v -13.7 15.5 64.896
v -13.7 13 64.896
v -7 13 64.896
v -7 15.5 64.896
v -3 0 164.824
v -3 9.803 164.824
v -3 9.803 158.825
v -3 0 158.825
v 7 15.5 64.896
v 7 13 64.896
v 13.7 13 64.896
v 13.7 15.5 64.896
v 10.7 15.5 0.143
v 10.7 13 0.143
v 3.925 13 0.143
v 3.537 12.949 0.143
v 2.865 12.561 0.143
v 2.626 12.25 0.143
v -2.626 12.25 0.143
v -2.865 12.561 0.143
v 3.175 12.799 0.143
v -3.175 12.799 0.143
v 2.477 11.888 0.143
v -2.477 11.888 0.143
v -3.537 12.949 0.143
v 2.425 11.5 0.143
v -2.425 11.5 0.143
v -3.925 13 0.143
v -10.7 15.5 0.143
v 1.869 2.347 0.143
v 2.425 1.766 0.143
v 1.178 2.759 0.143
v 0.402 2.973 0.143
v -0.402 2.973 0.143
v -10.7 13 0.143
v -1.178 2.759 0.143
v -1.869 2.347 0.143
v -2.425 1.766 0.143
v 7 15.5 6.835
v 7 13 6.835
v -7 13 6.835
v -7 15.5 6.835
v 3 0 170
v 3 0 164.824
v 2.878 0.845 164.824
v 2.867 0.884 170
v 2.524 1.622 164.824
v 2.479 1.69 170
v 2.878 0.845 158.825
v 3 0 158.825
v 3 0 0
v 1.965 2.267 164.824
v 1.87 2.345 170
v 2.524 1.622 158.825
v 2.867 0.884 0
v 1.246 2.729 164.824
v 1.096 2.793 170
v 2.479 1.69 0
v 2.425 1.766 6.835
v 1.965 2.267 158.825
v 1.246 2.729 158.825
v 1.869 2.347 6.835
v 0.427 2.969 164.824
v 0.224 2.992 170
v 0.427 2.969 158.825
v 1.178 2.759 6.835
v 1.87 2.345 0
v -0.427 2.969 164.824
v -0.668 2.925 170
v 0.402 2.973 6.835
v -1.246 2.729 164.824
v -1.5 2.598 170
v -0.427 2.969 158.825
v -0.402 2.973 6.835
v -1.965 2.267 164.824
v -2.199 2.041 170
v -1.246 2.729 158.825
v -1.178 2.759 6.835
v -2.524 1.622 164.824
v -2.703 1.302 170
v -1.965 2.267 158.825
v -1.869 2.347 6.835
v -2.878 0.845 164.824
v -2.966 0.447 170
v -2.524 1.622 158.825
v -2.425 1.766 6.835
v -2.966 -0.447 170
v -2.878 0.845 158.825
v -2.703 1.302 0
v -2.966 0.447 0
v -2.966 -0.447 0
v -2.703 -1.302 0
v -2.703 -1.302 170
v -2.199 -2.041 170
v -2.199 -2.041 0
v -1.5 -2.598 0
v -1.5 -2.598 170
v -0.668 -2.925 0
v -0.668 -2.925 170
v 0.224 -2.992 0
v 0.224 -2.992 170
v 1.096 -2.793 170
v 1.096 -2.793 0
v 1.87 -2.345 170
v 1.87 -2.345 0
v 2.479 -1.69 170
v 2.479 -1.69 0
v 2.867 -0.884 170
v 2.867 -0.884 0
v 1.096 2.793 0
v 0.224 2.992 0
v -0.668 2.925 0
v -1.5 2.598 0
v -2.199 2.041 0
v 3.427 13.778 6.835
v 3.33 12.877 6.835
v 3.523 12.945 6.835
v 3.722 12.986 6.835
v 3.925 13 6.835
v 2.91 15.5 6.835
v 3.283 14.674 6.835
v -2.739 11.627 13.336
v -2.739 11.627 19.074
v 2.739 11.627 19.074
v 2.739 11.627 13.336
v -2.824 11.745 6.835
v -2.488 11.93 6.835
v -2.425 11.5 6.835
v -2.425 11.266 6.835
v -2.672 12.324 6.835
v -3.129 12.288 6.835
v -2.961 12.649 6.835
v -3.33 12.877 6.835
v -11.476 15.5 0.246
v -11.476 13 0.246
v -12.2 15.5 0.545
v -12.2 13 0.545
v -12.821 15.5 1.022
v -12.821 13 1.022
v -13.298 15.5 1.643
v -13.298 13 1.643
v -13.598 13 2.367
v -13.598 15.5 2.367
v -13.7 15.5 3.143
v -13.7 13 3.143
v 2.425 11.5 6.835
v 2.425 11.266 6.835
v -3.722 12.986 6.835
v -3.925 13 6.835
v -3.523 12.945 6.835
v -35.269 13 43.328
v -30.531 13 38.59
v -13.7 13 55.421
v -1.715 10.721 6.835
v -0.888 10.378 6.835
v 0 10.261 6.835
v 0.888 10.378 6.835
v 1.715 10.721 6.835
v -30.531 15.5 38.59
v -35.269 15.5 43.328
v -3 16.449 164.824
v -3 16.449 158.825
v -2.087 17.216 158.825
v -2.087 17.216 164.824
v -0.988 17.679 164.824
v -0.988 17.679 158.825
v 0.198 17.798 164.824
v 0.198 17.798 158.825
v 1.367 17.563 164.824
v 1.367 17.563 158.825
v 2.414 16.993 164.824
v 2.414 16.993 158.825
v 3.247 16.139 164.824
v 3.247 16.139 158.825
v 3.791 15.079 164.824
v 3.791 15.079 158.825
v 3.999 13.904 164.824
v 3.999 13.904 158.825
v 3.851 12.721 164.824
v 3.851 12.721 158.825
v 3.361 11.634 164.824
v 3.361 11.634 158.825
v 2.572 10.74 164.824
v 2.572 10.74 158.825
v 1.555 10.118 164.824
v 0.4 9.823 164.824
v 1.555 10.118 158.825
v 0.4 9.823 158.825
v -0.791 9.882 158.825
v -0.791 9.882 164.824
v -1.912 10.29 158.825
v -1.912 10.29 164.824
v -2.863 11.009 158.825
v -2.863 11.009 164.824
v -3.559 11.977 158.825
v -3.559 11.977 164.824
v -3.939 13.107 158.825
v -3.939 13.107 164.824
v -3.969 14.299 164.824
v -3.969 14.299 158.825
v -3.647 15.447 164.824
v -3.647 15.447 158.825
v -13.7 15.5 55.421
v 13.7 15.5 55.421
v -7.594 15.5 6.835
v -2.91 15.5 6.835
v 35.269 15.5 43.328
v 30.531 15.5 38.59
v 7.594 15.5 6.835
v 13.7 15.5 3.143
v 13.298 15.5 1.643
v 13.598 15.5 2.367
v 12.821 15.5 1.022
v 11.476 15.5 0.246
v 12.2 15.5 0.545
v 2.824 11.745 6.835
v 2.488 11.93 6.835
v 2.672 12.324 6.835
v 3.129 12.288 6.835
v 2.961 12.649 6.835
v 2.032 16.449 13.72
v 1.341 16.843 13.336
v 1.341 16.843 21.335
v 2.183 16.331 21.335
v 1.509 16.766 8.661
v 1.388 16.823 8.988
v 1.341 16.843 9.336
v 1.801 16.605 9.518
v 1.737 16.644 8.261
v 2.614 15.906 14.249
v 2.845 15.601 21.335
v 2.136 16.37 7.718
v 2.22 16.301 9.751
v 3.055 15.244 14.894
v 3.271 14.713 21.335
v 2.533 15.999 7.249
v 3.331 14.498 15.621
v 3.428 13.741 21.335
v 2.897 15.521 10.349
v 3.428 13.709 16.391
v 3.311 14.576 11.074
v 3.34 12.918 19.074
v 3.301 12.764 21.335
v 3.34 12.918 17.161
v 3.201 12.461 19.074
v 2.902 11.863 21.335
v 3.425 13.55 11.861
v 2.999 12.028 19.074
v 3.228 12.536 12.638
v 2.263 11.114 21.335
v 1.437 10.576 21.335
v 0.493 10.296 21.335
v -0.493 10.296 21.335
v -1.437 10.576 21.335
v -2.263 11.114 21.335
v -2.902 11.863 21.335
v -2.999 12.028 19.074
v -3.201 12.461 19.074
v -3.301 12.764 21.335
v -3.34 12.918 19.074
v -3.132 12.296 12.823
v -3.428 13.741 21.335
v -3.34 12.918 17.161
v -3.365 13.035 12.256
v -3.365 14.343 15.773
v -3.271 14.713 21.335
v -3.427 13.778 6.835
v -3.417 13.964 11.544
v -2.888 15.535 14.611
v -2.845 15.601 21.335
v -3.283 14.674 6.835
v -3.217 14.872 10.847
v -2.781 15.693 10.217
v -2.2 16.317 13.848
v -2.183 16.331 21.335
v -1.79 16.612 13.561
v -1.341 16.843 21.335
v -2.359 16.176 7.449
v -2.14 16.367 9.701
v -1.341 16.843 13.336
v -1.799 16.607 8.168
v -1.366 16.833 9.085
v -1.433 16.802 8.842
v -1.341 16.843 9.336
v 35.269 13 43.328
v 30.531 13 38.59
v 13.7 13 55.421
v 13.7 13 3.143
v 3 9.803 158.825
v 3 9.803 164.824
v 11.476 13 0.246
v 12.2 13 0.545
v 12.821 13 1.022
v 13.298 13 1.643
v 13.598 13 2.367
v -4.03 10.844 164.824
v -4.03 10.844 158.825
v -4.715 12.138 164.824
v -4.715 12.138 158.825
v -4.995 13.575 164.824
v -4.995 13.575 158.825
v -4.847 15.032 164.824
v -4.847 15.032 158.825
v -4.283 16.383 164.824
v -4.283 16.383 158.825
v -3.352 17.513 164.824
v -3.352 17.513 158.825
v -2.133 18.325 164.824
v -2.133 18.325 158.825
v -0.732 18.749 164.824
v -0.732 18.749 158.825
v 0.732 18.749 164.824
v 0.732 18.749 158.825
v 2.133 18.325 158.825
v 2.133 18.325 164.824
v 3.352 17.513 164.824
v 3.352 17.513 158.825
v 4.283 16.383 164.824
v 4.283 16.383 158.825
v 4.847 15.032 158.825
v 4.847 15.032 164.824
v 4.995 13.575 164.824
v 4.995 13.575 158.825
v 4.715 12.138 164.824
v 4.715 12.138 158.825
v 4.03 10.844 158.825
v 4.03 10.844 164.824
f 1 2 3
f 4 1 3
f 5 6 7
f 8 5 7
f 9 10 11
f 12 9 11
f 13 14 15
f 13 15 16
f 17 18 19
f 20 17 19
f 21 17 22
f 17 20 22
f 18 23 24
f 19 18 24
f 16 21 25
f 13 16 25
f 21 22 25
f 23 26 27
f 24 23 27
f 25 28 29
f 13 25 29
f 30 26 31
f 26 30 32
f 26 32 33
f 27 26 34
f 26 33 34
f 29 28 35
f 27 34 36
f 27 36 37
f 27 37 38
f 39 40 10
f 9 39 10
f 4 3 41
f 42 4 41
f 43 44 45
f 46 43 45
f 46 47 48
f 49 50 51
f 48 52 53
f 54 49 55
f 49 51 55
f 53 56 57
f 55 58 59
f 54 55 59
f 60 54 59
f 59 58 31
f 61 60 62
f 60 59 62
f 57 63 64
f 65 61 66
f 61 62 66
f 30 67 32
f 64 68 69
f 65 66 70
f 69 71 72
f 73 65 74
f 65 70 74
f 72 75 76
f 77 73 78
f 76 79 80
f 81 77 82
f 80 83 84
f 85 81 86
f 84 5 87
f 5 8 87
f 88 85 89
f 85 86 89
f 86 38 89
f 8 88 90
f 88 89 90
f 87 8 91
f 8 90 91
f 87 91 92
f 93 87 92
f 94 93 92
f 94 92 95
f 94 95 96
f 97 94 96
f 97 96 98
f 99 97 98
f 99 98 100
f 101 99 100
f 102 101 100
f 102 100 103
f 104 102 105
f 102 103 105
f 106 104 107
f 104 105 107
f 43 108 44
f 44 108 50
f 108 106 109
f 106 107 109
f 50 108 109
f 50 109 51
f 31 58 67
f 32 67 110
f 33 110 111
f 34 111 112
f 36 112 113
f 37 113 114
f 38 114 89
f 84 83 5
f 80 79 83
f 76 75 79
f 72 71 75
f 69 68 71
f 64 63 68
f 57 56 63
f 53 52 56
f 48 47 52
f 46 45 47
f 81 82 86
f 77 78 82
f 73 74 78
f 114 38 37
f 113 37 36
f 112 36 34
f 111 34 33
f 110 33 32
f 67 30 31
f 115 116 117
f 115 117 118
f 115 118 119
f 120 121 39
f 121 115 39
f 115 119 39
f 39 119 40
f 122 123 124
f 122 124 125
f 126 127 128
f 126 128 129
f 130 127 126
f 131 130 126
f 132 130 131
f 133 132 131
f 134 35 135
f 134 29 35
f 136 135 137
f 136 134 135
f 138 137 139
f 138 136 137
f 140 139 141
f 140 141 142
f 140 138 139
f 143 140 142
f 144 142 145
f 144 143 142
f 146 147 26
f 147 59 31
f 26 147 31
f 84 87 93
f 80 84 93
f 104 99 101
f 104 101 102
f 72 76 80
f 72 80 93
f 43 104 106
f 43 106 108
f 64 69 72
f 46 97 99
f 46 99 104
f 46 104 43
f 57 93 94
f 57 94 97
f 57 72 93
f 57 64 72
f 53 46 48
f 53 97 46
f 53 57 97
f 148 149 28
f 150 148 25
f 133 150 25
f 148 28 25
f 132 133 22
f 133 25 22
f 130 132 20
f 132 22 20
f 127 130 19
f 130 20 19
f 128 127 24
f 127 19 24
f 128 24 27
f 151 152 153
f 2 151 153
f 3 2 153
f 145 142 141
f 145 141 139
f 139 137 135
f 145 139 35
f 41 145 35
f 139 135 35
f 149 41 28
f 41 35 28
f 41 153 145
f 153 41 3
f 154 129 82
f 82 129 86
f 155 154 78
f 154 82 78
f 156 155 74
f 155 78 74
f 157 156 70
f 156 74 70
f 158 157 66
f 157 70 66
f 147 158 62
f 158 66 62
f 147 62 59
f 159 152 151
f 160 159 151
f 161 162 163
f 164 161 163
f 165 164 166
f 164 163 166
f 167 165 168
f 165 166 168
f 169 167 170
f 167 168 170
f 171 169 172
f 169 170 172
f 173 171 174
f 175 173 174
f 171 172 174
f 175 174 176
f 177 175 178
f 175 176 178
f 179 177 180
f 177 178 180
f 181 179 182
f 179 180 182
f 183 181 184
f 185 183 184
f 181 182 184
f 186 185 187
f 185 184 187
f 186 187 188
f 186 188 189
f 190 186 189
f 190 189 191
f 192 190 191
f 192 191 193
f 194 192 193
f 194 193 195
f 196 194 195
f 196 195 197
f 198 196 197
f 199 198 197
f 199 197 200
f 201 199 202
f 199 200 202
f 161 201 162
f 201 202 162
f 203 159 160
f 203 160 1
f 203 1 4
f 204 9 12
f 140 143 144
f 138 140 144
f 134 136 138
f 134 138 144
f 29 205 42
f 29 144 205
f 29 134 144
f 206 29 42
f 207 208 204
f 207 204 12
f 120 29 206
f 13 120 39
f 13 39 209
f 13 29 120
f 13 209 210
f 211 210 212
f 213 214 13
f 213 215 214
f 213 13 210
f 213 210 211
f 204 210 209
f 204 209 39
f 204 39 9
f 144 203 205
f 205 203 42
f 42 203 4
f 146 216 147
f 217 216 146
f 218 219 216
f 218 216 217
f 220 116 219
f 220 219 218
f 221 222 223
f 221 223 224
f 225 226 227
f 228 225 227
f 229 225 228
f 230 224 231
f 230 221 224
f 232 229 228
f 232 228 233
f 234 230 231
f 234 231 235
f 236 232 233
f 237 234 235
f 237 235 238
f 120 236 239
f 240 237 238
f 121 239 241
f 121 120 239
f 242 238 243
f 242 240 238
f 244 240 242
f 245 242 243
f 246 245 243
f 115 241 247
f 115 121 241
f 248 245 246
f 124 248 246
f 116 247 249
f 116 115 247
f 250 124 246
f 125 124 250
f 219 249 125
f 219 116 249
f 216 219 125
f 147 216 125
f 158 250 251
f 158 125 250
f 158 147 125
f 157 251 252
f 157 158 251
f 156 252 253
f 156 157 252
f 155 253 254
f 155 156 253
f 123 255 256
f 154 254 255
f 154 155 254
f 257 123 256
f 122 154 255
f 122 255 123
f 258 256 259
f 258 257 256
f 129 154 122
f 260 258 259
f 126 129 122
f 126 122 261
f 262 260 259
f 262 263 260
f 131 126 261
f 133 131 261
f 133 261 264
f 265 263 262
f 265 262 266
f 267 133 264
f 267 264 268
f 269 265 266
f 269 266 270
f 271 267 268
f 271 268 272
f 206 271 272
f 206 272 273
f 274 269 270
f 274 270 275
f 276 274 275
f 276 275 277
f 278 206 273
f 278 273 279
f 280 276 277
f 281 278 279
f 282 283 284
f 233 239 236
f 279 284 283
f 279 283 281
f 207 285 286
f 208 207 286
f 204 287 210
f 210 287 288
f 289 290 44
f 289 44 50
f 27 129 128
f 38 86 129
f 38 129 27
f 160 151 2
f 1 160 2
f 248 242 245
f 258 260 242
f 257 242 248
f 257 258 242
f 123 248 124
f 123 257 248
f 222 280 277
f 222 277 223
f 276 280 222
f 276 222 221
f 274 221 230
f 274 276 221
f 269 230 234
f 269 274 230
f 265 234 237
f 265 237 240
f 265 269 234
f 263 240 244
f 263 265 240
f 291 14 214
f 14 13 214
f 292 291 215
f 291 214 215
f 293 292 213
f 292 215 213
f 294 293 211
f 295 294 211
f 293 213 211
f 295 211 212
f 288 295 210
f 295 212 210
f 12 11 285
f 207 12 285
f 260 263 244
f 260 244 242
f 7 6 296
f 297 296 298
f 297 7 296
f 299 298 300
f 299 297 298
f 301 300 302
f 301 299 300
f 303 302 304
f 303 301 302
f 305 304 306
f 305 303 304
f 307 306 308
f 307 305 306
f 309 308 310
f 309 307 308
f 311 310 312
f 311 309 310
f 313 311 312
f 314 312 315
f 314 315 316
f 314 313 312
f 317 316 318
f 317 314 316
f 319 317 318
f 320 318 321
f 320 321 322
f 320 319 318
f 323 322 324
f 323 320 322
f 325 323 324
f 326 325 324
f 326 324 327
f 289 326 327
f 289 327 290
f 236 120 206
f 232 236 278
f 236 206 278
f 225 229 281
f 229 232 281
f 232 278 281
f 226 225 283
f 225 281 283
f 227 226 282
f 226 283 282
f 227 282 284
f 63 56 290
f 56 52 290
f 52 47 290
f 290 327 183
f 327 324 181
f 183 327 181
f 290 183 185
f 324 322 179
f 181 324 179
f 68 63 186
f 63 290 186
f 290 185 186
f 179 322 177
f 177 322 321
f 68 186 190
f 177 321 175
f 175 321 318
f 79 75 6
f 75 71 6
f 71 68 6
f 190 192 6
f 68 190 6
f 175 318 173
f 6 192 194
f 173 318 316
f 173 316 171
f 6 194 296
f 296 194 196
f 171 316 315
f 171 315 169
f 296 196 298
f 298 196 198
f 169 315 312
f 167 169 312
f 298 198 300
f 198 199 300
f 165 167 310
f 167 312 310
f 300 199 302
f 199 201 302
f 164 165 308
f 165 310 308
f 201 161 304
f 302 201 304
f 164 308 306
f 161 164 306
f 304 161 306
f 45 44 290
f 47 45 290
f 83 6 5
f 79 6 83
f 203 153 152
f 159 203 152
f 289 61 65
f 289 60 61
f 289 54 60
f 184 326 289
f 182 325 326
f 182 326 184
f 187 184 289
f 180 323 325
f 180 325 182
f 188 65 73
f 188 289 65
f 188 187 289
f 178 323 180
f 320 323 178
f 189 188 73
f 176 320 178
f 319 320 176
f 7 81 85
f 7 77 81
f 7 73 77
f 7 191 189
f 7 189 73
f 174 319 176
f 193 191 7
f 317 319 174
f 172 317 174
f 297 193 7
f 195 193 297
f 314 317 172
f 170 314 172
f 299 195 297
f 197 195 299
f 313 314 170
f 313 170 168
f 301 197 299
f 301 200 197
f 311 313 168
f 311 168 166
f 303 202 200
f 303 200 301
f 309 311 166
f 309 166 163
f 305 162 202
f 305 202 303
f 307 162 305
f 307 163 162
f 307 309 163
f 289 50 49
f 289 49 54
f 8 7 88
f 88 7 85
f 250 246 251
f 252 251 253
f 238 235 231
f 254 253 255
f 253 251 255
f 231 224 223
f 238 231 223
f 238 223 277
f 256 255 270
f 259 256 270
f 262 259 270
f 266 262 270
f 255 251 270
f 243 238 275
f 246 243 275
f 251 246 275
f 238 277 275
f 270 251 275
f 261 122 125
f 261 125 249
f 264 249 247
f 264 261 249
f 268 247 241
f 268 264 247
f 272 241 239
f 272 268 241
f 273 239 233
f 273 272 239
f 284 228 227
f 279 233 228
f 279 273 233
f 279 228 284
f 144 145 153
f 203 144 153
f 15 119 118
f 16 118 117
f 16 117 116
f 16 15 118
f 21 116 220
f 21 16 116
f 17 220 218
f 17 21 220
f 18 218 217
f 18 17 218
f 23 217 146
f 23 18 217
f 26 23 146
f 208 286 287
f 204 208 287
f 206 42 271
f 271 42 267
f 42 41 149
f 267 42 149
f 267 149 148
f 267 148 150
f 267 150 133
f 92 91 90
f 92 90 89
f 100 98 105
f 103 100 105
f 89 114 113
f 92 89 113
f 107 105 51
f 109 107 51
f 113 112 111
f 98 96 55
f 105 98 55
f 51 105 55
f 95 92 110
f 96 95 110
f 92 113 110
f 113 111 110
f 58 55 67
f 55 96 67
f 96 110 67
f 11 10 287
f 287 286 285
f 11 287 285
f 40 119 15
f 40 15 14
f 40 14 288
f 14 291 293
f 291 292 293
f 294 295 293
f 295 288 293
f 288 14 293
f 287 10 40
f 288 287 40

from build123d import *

# Parameters (mm, degrees)
SKETCH1_R               = 3
BOSS_EXTRUDE1_DEPTH     = 170
SKETCH3_W               = 4.850977856
SKETCH3_H               = 6.691139058
BOSS_EXTRUDE2_DEPTH     = 13
SKETCH5_W               = 14
SKETCH5_H               = 6.691139058
BOSS_EXTRUDE4_DEPTH     = 2.5
FILLET1_R               = 1.5
FILLET2_R               = 3
BOSS_EXTRUDE6_DEPTH     = 14.5
FILLET3_R               = 3
CUT_EXTRUDE1_DEPTH      = 4
CUT_EXTRUDE1_DEPTH_BACK = 4.5
SKETCH15_W              = 6
SKETCH15_H              = 5.998501846
BOSS_EXTRUDE7_DEPTH     = 16.843139176
SKETCH16_R              = 5
SKETCH16_R_2            = 4
BOSS_EXTRUDE9_DEPTH     = 5.998501846
CUT_EXTRUDE6_START      = -5.998501846
SKETCH17_R              = 4
CUT_EXTRUDE6_DEPTH      = 5.998501846


with BuildPart() as part:
    # Sketch1 → Boss-Extrude1 (new body)
    with BuildSketch(Plane.XY):
        Circle(SKETCH1_R)
    extrude(amount=BOSS_EXTRUDE1_DEPTH)

    # Sketch3 → Boss-Extrude2 (add)
    with BuildSketch(Plane(origin=(0, 0, 0), x_dir=(1, 0, 0), z_dir=(0, 1, 0))):
        with Locations((0, -3.488992019)):
            Rectangle(SKETCH3_W, SKETCH3_H)
    extrude(amount=BOSS_EXTRUDE2_DEPTH)

    # Sketch5 → Boss-Extrude4 (add)
    with BuildSketch(Plane(origin=(0, 13, 0), x_dir=(1, 0, 0), z_dir=(0, 1, 0))):
        with Locations((0, -3.488992019)):
            Rectangle(SKETCH5_W, SKETCH5_H)
        Polygon((-7, -6.834561548), (-7, -0.14342249), (-13.7, -0.14342249), (-13.7, -55.421203077), (-30.531042429, -38.590160648), (-35.268657863, -43.327776082), (-13.7, -64.896433945), (-7, -64.896433945), align=None)
        Polygon((13.7, -0.14342249), (7, -0.14342249), (7, -6.834561548), (7, -64.896433945), (13.7, -64.896433945), (35.268657863, -43.327776082), (30.531042429, -38.590160648), (13.7, -55.421203077), align=None)
    extrude(amount=BOSS_EXTRUDE4_DEPTH)

    # Fillet1
    fillet1_edges = [part.edges().sort_by_distance(p)[0] for p in [
        (-2.425488928, 13, 3.488992019),
        (2.425488928, 13, 3.488992019),
    ]]
    fillet(fillet1_edges, radius=FILLET1_R)

    # Fillet2
    fillet2_edges = [part.edges().sort_by_distance(p)[0] for p in [
        (13.7, 14.25, 0.14342249),
        (-13.7, 14.25, 0.14342249),
    ]]
    fillet(fillet2_edges, radius=FILLET2_R)

    # Sketch8 → Boss-Extrude6 (add)
    with BuildSketch(Plane.XY.offset(6.834561548)):
        with BuildLine():
            Line((-1.341226683, 16.843139176), (1.341226683, 16.843139176))
            ThreePointArc((1.341226683, 16.843139176), (0, 10.260613318), (-1.341226683, 16.843139176))
        make_face()
    extrude(amount=BOSS_EXTRUDE6_DEPTH)

    # Fillet3
    # the kernel refuses this fillet: 3 mm, written as the material it takes off along each edge
    with BuildSketch(Plane(origin=(-7.593632325, 16.843139176, 6.834561548), x_dir=(0, -1.0, 1.7735276910753176e-12), z_dir=(1, 0, 0))) as fillet3_piece_1:
        with BuildLine():
            CenterArc((3, -2.500962257), FILLET3_R, 123.524048603, 56.475951397)
            Line((0, -2.500962257), (-0.06, -2.500962257))
            Line((-0.06, -2.500962257), (-0.06, 0))
            Line((-0.06, 0), (0, 0.06))
            ThreePointArc((0, 0.06), (0.671569588, 0.06), (1.31000196, 0.050019245))
            Line((1.31000196, 0.050019245), (1.343139176, 0))
        make_face()
    extrude(amount=15.187264651, mode=Mode.SUBTRACT)

    # Sketch14 → Cut-Extrude1 (cut, two sides: drawn at the far end of the back side and taken through both)
    with BuildSketch(Plane(origin=(0, 0, 0), x_dir=(0, 0, -1), z_dir=(1, 0, 0)).offset(-CUT_EXTRUDE1_DEPTH_BACK)):
        Polygon((-9.335523805, 16.843139176), (-13.335523805, 16.843139176), (-17.161439006, 12.918121422), (-19.074284697, 12.918121422), (-19.074284697, 11.627222293), (-13.335523805, 11.627222293), align=None)
    extrude(amount=CUT_EXTRUDE1_DEPTH + CUT_EXTRUDE1_DEPTH_BACK, mode=Mode.SUBTRACT)

    # Sketch15 → Boss-Extrude7 (add)
    with BuildSketch(Plane(origin=(0, 0, 0), x_dir=(1, 0, 0), z_dir=(0, 1, 0))):
        with Locations((0, -161.824268897)):
            Rectangle(SKETCH15_W, SKETCH15_H)
    extrude(amount=BOSS_EXTRUDE7_DEPTH)

    # Sketch16 → Boss-Extrude9 (add)
    with BuildSketch(Plane(origin=(0, 0, 158.825017974), x_dir=(-1, 0, 0), z_dir=(0, 0, -1))):
        with Locations((0, 13.803369952)):
            Circle(SKETCH16_R)
        with Locations((0, 13.803369952)):
            Circle(SKETCH16_R_2, mode=Mode.SUBTRACT)
    extrude(amount=-BOSS_EXTRUDE9_DEPTH)

    # Sketch17 → Cut-Extrude6 (cut)
    with BuildSketch(Plane.XY.offset(164.82351982).offset(CUT_EXTRUDE6_START)):
        with Locations(Location((0, 13.803369952, 0), (0, 0, 180))):
            Circle(SKETCH17_R)
    extrude(amount=CUT_EXTRUDE6_DEPTH, mode=Mode.SUBTRACT)


solid = part.part
